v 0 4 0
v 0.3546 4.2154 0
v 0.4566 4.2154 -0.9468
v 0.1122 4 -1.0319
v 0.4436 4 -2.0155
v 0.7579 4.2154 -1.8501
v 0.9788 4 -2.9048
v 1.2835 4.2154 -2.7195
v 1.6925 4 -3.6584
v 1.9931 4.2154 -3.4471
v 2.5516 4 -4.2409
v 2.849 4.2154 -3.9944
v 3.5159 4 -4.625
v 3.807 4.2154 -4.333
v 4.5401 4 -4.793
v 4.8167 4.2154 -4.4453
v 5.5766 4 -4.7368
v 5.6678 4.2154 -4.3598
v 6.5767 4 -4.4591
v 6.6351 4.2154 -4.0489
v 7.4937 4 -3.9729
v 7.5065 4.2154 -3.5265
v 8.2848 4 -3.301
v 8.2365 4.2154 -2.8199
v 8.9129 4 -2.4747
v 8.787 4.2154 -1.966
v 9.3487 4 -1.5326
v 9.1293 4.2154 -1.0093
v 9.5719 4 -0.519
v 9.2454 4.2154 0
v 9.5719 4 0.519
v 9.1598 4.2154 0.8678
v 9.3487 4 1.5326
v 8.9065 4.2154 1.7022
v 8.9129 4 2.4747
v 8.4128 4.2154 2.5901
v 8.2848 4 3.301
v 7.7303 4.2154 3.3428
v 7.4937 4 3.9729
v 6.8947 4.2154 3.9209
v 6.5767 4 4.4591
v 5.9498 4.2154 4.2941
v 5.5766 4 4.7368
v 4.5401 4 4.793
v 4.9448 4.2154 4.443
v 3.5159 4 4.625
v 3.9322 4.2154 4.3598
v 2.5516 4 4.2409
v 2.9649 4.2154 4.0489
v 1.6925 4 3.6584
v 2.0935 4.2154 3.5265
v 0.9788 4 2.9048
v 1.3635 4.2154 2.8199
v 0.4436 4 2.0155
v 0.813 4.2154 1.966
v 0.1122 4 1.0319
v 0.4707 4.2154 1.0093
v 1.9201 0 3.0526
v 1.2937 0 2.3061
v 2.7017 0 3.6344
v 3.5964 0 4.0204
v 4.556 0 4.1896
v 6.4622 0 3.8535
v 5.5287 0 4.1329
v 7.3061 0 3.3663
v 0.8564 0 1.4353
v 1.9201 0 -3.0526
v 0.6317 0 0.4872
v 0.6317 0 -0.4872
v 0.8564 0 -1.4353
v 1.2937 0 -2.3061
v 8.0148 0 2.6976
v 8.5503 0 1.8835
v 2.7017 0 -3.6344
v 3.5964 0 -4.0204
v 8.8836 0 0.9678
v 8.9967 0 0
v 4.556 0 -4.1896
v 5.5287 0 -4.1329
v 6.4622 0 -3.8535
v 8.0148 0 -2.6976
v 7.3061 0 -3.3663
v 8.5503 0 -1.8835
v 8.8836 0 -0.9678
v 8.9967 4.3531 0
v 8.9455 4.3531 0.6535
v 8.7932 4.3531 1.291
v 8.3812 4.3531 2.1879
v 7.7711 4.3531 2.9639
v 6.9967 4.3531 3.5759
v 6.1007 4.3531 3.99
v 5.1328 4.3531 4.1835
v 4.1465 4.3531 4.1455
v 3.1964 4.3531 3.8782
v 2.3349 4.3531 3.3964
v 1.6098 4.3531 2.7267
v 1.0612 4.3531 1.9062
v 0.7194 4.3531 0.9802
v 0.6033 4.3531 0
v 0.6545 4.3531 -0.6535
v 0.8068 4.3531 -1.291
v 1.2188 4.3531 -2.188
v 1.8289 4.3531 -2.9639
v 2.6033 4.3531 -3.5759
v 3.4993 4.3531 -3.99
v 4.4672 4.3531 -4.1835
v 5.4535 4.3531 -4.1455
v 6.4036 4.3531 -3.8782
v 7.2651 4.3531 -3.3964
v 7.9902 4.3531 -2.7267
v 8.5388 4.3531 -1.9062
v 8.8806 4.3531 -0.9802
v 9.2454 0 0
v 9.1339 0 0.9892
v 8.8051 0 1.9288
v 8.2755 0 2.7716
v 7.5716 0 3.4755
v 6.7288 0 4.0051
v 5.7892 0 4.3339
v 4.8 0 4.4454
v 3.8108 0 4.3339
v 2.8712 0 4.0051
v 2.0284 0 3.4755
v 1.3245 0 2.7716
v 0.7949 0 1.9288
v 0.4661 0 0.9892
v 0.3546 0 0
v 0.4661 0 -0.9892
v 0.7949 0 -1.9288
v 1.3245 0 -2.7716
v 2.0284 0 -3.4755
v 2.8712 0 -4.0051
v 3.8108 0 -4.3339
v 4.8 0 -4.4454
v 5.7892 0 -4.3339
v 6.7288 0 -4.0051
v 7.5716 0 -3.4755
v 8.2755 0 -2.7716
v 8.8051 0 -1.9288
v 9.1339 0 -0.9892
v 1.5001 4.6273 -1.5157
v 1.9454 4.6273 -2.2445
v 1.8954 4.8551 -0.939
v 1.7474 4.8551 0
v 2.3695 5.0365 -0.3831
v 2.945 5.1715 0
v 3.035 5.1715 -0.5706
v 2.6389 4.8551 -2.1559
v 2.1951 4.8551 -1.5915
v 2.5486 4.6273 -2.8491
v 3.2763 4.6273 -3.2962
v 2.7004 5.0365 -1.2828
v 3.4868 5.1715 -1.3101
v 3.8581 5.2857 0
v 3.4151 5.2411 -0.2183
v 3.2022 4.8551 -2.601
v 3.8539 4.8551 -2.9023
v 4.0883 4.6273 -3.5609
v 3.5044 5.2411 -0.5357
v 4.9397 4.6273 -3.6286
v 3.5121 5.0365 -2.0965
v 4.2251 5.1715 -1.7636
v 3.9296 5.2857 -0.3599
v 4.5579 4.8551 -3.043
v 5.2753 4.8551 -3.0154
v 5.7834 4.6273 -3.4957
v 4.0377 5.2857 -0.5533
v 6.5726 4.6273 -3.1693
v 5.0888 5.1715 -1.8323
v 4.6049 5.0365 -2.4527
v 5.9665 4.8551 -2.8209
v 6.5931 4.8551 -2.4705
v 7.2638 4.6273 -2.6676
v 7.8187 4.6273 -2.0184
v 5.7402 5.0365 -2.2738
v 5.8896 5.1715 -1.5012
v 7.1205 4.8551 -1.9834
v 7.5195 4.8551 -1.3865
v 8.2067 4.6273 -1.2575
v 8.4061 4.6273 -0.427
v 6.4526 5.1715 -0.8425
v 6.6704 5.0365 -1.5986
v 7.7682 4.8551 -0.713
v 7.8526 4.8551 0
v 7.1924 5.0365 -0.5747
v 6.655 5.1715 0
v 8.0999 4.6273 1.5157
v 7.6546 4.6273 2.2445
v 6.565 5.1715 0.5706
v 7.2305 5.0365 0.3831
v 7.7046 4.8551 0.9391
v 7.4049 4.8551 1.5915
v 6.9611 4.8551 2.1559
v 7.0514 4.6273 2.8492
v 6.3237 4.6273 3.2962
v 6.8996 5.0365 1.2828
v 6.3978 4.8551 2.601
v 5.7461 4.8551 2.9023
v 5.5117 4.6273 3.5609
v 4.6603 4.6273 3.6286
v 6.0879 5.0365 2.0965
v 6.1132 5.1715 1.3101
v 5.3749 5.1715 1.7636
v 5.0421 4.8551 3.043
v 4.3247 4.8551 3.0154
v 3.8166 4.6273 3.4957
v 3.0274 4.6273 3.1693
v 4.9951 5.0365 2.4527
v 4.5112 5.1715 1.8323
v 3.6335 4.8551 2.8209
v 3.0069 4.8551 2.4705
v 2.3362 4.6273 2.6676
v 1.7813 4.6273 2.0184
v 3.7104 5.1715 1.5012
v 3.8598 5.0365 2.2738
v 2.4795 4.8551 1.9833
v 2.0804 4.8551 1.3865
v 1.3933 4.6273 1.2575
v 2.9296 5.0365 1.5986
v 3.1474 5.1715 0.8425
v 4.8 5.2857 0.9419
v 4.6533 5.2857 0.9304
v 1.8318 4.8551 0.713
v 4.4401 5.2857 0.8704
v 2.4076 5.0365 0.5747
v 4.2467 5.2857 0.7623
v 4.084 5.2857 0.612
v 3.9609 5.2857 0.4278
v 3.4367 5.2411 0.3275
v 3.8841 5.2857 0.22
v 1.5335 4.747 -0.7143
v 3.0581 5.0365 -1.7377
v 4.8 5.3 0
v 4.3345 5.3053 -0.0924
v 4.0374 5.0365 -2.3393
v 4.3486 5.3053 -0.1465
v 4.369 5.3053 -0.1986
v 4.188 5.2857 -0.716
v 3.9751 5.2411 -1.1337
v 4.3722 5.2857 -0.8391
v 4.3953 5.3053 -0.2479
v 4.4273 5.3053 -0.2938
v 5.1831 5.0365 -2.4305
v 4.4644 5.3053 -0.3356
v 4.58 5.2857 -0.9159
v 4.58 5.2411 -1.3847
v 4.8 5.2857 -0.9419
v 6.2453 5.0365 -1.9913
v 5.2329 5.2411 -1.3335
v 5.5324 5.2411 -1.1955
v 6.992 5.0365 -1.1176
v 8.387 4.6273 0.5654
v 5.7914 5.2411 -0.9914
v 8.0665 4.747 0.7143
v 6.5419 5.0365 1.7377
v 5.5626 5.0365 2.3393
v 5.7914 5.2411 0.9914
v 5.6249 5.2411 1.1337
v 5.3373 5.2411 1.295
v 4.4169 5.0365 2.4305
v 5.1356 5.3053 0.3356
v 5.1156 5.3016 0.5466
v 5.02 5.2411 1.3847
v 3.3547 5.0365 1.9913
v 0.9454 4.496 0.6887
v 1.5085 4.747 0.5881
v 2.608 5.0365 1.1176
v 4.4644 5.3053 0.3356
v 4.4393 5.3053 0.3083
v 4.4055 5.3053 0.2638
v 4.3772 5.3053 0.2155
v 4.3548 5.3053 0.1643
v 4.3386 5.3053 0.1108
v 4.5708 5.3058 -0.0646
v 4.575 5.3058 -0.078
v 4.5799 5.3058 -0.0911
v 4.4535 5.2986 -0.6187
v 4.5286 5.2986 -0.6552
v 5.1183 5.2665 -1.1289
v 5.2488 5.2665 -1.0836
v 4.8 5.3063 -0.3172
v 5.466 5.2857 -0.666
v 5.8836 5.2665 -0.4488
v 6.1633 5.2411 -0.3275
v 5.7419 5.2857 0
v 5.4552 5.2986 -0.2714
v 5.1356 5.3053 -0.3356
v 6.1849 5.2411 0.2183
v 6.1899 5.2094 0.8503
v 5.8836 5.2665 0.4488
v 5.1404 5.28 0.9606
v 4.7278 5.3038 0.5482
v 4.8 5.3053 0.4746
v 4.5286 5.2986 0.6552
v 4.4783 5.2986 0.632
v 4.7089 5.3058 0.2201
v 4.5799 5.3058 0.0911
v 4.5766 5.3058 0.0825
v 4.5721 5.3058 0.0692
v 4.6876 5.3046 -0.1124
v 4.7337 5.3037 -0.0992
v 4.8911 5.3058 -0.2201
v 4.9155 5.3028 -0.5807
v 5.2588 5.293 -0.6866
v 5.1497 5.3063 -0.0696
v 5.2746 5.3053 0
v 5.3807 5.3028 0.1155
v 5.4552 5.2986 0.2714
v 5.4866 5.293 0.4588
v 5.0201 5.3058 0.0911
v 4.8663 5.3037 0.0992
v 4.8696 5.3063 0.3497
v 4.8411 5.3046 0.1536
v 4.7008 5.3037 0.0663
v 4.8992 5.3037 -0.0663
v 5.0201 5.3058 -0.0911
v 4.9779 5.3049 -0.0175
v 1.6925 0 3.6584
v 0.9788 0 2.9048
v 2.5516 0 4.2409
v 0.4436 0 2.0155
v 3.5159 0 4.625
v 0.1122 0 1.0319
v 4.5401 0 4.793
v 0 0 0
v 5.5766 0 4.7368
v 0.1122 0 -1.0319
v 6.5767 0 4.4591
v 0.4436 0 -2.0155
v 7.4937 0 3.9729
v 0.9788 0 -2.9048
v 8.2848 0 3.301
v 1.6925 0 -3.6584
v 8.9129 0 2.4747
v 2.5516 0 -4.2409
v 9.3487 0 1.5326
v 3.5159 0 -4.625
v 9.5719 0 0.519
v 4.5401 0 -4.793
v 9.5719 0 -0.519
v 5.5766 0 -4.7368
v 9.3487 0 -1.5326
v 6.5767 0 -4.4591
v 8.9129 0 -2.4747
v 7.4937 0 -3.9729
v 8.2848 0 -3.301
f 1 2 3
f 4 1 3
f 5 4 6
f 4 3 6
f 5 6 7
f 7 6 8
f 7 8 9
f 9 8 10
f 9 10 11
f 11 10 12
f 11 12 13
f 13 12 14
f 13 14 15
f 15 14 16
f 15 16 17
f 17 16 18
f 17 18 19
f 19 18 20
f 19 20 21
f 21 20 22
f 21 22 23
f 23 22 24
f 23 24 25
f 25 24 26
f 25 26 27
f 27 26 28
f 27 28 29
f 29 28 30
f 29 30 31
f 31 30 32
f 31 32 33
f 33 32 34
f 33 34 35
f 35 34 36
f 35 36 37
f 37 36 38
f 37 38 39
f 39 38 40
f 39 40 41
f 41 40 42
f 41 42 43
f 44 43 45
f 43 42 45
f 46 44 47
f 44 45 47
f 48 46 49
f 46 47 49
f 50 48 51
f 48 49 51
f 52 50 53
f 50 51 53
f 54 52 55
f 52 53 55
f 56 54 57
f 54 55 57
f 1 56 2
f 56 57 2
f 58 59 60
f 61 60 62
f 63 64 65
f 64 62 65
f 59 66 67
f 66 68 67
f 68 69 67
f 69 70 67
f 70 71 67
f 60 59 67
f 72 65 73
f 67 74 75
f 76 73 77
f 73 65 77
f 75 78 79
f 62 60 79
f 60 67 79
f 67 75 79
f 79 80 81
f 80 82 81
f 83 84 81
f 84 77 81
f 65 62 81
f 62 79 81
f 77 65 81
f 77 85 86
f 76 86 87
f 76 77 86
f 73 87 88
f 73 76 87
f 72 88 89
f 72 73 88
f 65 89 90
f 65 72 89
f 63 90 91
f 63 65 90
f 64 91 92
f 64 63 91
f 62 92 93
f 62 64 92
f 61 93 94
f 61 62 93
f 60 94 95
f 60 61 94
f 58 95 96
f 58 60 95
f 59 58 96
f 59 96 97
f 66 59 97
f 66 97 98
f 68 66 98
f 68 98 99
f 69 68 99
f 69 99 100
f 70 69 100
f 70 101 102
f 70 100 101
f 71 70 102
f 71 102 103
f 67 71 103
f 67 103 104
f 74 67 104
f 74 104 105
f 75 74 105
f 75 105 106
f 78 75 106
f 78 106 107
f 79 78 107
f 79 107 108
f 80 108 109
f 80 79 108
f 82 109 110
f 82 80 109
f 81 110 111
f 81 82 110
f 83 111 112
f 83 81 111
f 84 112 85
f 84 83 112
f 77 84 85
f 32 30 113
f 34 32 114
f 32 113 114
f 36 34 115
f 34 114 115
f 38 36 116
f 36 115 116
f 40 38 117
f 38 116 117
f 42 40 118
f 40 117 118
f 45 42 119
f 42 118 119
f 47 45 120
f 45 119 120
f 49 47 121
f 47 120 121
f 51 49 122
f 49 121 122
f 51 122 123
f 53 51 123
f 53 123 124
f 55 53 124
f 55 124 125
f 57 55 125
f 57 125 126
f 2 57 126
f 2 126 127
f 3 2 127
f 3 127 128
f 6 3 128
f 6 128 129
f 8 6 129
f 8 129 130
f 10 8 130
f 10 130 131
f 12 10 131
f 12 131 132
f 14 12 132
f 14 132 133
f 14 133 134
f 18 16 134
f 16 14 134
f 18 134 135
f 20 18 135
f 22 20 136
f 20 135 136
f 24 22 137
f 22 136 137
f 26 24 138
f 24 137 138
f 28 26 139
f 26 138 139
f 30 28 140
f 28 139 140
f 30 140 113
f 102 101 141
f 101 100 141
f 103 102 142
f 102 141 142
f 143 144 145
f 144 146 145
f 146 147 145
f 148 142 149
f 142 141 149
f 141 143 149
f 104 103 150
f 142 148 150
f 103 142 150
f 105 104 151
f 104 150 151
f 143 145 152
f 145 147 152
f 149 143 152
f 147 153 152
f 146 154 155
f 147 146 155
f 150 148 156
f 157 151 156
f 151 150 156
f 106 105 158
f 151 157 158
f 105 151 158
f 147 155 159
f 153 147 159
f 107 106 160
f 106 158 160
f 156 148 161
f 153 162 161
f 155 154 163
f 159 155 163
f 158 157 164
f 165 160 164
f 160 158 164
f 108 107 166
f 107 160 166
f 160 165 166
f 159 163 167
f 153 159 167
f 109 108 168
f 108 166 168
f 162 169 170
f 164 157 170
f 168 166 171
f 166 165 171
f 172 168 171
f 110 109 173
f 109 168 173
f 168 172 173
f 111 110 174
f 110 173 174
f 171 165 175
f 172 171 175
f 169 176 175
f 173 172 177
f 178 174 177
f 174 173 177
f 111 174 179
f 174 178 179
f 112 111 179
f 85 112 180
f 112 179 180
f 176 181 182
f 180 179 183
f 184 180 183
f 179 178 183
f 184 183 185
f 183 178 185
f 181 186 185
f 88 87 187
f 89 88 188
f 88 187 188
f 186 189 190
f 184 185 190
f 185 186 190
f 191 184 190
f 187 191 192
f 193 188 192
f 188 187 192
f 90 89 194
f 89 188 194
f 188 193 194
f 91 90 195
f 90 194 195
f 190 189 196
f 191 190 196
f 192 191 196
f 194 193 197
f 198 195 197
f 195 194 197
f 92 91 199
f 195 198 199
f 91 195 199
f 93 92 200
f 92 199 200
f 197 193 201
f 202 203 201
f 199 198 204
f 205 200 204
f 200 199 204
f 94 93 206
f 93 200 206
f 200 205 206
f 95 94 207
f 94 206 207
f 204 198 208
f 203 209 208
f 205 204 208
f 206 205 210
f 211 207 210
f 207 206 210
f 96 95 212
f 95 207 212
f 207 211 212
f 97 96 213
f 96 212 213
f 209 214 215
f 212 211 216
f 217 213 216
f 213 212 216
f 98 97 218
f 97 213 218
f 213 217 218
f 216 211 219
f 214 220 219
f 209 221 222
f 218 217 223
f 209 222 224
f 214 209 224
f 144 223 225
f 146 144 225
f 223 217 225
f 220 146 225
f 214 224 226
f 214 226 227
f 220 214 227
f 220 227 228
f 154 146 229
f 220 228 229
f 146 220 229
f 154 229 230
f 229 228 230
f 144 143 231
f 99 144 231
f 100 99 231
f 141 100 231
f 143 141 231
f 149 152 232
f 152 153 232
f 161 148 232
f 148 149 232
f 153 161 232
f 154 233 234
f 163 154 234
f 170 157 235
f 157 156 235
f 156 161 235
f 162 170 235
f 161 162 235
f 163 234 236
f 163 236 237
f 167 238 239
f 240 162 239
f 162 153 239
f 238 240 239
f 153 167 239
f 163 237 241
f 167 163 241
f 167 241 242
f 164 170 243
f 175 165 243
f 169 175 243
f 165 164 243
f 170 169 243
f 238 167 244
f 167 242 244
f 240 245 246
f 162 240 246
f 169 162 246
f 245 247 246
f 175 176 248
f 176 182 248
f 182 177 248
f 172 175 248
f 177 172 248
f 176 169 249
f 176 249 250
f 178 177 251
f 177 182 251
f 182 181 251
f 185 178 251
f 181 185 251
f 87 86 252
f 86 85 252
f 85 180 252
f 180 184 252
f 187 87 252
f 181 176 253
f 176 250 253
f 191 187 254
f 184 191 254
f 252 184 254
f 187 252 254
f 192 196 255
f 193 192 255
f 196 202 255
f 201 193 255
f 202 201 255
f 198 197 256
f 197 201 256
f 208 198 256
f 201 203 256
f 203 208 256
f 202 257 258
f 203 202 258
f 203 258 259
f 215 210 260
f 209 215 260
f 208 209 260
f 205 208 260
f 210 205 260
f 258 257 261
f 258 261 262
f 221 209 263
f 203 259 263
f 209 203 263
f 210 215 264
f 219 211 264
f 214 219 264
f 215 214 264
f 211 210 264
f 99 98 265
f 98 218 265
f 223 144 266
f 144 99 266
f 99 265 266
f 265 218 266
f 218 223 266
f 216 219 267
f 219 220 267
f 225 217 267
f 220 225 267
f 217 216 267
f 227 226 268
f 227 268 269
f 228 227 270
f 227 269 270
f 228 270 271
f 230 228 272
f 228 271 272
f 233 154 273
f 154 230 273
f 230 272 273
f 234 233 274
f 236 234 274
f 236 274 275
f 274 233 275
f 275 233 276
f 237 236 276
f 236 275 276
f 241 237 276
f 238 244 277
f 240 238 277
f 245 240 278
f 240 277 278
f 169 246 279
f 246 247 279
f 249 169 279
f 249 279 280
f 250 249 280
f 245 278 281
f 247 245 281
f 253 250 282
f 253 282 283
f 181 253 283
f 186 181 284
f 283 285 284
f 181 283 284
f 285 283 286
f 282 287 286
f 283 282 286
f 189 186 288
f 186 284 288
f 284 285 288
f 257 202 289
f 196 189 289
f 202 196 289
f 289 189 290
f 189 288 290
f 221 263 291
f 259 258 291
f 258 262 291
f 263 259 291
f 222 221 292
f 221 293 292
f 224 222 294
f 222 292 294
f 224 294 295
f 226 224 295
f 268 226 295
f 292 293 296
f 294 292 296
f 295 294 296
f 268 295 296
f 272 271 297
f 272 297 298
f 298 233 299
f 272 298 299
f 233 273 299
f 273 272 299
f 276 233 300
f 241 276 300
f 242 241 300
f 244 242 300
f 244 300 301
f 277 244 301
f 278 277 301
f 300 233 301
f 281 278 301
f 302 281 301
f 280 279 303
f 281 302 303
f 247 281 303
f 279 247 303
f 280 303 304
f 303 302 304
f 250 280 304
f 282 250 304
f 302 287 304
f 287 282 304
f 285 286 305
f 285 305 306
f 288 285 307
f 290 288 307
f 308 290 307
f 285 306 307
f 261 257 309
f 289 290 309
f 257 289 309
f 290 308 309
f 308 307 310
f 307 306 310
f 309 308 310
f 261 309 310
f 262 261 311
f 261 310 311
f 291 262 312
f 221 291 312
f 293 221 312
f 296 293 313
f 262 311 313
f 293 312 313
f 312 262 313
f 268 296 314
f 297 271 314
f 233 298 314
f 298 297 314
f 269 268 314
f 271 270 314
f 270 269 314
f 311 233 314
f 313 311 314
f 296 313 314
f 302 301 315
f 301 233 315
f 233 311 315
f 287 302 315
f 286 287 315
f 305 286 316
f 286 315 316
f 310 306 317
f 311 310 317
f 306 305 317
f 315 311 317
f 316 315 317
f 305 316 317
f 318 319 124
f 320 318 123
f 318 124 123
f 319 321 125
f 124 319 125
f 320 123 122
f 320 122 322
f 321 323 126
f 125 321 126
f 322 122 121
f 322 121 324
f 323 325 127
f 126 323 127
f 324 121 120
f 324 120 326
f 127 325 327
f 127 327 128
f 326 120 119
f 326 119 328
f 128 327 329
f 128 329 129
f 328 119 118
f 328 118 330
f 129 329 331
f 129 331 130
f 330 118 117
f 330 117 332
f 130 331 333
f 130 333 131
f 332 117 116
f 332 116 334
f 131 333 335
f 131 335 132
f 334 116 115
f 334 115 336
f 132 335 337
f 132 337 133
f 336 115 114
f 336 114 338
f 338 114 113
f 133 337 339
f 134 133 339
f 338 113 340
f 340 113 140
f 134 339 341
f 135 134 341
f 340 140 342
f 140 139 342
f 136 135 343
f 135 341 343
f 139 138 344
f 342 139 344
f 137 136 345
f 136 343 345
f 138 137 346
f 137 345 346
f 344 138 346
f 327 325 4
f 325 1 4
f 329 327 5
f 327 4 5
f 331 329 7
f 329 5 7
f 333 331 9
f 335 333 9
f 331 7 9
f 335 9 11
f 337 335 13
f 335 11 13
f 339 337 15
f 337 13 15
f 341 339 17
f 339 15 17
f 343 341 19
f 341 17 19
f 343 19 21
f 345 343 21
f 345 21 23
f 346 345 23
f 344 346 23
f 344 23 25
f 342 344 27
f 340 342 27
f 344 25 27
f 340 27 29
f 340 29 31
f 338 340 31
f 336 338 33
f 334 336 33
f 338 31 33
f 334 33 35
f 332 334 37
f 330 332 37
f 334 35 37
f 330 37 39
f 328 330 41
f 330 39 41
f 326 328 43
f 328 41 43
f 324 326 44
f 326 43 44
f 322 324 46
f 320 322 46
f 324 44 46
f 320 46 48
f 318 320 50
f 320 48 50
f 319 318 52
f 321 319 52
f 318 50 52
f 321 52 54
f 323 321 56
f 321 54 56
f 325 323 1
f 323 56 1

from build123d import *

# Parameters (mm, degrees)
SKETCH2_R          = 4.44536043
SKETCH2_R_2        = 4.196679611
CUT_EXTRUDE1_DEPTH = 4.5


with BuildPart() as part:
    # Sketch1 → Revolve1 (revolve)
    with BuildSketch(Plane.XY):
        with BuildLine():
            Line((0, 0), (0, 4))
            add(Edge.make_bspline(
                [(0, 4), (2.184134462, 5.397553825), (4.8, 5.3)],
                knots=[0, 0, 0, 1, 1, 1], degree=2))
            Line((4.8, 5.3), (4.8, 0))
            Line((4.8, 0), (0, 0))
        make_face()
    revolve(axis=Axis((4.8, 5.3, 0), (0, -1, 0)))

    # Sketch2 → Cut-Extrude1 (cut)
    with BuildSketch(Plane.XZ):
        with Locations((4.8, 0)):
            Circle(SKETCH2_R)
        with Locations((4.8, 0)):
            Circle(SKETCH2_R_2, mode=Mode.SUBTRACT)
    extrude(amount=-CUT_EXTRUDE1_DEPTH, mode=Mode.SUBTRACT)


solid = part.part
